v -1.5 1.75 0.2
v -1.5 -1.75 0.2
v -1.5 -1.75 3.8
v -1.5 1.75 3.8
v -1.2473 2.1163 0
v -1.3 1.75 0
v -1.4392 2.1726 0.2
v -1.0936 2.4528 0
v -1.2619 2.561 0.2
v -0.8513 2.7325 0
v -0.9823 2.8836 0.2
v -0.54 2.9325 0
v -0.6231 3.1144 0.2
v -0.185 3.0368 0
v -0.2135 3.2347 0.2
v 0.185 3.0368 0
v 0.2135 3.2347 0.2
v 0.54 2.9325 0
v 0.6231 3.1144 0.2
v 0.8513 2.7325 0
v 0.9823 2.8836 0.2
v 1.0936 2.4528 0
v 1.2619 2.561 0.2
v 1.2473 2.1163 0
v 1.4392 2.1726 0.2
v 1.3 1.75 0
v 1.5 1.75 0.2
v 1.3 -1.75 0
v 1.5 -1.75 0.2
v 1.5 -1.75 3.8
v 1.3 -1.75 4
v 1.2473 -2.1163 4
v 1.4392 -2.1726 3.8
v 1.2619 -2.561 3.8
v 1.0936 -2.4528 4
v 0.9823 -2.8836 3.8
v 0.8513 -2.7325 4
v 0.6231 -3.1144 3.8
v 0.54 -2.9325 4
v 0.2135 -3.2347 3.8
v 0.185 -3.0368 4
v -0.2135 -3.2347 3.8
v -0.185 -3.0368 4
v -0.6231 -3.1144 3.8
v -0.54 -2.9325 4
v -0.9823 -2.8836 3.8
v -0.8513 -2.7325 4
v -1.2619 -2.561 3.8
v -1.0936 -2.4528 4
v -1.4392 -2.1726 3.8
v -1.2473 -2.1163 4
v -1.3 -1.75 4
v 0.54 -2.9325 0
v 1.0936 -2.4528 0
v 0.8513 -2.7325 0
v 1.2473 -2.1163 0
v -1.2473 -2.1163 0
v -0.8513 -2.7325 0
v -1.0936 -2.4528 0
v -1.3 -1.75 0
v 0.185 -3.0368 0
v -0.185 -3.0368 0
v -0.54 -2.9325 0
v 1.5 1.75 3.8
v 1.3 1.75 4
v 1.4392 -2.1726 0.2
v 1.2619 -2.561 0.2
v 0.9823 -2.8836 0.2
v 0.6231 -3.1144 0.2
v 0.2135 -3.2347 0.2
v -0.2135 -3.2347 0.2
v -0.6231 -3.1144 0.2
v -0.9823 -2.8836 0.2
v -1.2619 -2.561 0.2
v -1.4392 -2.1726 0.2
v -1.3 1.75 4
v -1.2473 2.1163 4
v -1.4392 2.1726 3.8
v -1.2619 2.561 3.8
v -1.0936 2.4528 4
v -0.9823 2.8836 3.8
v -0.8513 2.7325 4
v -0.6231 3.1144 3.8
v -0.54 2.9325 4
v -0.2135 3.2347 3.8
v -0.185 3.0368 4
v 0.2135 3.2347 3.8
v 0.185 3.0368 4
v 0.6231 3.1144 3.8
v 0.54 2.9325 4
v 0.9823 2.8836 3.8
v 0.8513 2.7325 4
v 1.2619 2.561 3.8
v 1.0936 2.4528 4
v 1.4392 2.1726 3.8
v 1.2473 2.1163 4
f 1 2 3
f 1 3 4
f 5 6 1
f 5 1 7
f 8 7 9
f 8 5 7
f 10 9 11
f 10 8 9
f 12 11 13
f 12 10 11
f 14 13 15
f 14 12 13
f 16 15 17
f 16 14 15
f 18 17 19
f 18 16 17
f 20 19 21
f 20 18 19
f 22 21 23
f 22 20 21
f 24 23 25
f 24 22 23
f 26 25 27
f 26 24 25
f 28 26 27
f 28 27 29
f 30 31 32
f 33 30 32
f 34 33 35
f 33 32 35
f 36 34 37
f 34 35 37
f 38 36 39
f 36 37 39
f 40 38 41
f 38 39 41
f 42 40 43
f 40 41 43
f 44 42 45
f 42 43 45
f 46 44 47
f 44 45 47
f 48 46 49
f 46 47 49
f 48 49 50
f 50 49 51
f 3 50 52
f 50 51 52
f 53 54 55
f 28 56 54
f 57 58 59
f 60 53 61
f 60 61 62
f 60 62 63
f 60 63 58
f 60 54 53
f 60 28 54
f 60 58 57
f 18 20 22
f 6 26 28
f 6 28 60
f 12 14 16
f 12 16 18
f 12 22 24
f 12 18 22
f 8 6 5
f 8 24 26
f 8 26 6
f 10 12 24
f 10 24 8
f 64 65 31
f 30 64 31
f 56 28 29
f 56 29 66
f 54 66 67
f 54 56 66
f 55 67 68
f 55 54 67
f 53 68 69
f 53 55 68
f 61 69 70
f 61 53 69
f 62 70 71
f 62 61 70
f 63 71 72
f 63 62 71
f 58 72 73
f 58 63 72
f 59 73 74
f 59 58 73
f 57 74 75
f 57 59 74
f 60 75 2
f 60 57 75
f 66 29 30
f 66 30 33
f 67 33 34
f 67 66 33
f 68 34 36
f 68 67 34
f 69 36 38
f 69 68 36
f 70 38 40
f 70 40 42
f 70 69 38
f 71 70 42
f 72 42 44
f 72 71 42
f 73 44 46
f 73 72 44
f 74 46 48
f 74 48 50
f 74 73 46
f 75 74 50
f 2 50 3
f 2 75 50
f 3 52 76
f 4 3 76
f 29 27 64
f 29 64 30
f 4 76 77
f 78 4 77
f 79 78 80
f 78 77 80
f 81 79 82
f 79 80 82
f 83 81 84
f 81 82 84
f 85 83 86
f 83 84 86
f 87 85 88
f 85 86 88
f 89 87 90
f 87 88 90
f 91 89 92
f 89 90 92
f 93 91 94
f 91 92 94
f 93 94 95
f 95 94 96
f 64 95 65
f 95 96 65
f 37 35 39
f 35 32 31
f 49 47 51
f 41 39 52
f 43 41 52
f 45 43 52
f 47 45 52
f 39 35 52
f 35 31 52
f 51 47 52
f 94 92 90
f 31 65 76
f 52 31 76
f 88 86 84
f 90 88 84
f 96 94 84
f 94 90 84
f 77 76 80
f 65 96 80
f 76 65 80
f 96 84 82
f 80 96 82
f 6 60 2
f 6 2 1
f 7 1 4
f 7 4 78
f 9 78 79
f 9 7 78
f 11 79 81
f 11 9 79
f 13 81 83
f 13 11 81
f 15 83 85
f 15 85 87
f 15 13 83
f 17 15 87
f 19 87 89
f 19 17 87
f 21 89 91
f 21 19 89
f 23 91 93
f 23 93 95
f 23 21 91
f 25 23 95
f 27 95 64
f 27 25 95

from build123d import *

# Parameters (mm, degrees)
EXTRUDE_1_DEPTH = 4
CHAMFER_1_SIZE  = 0.2


with BuildPart() as part:
    # 草图1 → 凸台-拉伸1 (new body)
    with BuildSketch(Plane.XY):
        with BuildLine():
            Line((-1.5, -1.75), (-1.5, 1.75))
            ThreePointArc((-1.5, 1.75), (0, 3.25), (1.5, 1.75))
            Line((1.5, 1.75), (1.5, -1.75))
            ThreePointArc((1.5, -1.75), (0, -3.25), (-1.5, -1.75))
        make_face()
    extrude(amount=EXTRUDE_1_DEPTH)

    # 倒角1
    chamfer_1_edges = [part.edges().sort_by_distance(p)[0] for p in [
        (0, 3.25, 4),
        (-1.5, 0, 4),
        (0, -3.25, 4),
        (-1.5, 0, 0),
        (0, 3.25, 0),
        (1.5, 0, 0),
        (0, -3.25, 0),
        (1.5, 0, 4),
    ]]
    chamfer(chamfer_1_edges, length=CHAMFER_1_SIZE)


solid = part.part
